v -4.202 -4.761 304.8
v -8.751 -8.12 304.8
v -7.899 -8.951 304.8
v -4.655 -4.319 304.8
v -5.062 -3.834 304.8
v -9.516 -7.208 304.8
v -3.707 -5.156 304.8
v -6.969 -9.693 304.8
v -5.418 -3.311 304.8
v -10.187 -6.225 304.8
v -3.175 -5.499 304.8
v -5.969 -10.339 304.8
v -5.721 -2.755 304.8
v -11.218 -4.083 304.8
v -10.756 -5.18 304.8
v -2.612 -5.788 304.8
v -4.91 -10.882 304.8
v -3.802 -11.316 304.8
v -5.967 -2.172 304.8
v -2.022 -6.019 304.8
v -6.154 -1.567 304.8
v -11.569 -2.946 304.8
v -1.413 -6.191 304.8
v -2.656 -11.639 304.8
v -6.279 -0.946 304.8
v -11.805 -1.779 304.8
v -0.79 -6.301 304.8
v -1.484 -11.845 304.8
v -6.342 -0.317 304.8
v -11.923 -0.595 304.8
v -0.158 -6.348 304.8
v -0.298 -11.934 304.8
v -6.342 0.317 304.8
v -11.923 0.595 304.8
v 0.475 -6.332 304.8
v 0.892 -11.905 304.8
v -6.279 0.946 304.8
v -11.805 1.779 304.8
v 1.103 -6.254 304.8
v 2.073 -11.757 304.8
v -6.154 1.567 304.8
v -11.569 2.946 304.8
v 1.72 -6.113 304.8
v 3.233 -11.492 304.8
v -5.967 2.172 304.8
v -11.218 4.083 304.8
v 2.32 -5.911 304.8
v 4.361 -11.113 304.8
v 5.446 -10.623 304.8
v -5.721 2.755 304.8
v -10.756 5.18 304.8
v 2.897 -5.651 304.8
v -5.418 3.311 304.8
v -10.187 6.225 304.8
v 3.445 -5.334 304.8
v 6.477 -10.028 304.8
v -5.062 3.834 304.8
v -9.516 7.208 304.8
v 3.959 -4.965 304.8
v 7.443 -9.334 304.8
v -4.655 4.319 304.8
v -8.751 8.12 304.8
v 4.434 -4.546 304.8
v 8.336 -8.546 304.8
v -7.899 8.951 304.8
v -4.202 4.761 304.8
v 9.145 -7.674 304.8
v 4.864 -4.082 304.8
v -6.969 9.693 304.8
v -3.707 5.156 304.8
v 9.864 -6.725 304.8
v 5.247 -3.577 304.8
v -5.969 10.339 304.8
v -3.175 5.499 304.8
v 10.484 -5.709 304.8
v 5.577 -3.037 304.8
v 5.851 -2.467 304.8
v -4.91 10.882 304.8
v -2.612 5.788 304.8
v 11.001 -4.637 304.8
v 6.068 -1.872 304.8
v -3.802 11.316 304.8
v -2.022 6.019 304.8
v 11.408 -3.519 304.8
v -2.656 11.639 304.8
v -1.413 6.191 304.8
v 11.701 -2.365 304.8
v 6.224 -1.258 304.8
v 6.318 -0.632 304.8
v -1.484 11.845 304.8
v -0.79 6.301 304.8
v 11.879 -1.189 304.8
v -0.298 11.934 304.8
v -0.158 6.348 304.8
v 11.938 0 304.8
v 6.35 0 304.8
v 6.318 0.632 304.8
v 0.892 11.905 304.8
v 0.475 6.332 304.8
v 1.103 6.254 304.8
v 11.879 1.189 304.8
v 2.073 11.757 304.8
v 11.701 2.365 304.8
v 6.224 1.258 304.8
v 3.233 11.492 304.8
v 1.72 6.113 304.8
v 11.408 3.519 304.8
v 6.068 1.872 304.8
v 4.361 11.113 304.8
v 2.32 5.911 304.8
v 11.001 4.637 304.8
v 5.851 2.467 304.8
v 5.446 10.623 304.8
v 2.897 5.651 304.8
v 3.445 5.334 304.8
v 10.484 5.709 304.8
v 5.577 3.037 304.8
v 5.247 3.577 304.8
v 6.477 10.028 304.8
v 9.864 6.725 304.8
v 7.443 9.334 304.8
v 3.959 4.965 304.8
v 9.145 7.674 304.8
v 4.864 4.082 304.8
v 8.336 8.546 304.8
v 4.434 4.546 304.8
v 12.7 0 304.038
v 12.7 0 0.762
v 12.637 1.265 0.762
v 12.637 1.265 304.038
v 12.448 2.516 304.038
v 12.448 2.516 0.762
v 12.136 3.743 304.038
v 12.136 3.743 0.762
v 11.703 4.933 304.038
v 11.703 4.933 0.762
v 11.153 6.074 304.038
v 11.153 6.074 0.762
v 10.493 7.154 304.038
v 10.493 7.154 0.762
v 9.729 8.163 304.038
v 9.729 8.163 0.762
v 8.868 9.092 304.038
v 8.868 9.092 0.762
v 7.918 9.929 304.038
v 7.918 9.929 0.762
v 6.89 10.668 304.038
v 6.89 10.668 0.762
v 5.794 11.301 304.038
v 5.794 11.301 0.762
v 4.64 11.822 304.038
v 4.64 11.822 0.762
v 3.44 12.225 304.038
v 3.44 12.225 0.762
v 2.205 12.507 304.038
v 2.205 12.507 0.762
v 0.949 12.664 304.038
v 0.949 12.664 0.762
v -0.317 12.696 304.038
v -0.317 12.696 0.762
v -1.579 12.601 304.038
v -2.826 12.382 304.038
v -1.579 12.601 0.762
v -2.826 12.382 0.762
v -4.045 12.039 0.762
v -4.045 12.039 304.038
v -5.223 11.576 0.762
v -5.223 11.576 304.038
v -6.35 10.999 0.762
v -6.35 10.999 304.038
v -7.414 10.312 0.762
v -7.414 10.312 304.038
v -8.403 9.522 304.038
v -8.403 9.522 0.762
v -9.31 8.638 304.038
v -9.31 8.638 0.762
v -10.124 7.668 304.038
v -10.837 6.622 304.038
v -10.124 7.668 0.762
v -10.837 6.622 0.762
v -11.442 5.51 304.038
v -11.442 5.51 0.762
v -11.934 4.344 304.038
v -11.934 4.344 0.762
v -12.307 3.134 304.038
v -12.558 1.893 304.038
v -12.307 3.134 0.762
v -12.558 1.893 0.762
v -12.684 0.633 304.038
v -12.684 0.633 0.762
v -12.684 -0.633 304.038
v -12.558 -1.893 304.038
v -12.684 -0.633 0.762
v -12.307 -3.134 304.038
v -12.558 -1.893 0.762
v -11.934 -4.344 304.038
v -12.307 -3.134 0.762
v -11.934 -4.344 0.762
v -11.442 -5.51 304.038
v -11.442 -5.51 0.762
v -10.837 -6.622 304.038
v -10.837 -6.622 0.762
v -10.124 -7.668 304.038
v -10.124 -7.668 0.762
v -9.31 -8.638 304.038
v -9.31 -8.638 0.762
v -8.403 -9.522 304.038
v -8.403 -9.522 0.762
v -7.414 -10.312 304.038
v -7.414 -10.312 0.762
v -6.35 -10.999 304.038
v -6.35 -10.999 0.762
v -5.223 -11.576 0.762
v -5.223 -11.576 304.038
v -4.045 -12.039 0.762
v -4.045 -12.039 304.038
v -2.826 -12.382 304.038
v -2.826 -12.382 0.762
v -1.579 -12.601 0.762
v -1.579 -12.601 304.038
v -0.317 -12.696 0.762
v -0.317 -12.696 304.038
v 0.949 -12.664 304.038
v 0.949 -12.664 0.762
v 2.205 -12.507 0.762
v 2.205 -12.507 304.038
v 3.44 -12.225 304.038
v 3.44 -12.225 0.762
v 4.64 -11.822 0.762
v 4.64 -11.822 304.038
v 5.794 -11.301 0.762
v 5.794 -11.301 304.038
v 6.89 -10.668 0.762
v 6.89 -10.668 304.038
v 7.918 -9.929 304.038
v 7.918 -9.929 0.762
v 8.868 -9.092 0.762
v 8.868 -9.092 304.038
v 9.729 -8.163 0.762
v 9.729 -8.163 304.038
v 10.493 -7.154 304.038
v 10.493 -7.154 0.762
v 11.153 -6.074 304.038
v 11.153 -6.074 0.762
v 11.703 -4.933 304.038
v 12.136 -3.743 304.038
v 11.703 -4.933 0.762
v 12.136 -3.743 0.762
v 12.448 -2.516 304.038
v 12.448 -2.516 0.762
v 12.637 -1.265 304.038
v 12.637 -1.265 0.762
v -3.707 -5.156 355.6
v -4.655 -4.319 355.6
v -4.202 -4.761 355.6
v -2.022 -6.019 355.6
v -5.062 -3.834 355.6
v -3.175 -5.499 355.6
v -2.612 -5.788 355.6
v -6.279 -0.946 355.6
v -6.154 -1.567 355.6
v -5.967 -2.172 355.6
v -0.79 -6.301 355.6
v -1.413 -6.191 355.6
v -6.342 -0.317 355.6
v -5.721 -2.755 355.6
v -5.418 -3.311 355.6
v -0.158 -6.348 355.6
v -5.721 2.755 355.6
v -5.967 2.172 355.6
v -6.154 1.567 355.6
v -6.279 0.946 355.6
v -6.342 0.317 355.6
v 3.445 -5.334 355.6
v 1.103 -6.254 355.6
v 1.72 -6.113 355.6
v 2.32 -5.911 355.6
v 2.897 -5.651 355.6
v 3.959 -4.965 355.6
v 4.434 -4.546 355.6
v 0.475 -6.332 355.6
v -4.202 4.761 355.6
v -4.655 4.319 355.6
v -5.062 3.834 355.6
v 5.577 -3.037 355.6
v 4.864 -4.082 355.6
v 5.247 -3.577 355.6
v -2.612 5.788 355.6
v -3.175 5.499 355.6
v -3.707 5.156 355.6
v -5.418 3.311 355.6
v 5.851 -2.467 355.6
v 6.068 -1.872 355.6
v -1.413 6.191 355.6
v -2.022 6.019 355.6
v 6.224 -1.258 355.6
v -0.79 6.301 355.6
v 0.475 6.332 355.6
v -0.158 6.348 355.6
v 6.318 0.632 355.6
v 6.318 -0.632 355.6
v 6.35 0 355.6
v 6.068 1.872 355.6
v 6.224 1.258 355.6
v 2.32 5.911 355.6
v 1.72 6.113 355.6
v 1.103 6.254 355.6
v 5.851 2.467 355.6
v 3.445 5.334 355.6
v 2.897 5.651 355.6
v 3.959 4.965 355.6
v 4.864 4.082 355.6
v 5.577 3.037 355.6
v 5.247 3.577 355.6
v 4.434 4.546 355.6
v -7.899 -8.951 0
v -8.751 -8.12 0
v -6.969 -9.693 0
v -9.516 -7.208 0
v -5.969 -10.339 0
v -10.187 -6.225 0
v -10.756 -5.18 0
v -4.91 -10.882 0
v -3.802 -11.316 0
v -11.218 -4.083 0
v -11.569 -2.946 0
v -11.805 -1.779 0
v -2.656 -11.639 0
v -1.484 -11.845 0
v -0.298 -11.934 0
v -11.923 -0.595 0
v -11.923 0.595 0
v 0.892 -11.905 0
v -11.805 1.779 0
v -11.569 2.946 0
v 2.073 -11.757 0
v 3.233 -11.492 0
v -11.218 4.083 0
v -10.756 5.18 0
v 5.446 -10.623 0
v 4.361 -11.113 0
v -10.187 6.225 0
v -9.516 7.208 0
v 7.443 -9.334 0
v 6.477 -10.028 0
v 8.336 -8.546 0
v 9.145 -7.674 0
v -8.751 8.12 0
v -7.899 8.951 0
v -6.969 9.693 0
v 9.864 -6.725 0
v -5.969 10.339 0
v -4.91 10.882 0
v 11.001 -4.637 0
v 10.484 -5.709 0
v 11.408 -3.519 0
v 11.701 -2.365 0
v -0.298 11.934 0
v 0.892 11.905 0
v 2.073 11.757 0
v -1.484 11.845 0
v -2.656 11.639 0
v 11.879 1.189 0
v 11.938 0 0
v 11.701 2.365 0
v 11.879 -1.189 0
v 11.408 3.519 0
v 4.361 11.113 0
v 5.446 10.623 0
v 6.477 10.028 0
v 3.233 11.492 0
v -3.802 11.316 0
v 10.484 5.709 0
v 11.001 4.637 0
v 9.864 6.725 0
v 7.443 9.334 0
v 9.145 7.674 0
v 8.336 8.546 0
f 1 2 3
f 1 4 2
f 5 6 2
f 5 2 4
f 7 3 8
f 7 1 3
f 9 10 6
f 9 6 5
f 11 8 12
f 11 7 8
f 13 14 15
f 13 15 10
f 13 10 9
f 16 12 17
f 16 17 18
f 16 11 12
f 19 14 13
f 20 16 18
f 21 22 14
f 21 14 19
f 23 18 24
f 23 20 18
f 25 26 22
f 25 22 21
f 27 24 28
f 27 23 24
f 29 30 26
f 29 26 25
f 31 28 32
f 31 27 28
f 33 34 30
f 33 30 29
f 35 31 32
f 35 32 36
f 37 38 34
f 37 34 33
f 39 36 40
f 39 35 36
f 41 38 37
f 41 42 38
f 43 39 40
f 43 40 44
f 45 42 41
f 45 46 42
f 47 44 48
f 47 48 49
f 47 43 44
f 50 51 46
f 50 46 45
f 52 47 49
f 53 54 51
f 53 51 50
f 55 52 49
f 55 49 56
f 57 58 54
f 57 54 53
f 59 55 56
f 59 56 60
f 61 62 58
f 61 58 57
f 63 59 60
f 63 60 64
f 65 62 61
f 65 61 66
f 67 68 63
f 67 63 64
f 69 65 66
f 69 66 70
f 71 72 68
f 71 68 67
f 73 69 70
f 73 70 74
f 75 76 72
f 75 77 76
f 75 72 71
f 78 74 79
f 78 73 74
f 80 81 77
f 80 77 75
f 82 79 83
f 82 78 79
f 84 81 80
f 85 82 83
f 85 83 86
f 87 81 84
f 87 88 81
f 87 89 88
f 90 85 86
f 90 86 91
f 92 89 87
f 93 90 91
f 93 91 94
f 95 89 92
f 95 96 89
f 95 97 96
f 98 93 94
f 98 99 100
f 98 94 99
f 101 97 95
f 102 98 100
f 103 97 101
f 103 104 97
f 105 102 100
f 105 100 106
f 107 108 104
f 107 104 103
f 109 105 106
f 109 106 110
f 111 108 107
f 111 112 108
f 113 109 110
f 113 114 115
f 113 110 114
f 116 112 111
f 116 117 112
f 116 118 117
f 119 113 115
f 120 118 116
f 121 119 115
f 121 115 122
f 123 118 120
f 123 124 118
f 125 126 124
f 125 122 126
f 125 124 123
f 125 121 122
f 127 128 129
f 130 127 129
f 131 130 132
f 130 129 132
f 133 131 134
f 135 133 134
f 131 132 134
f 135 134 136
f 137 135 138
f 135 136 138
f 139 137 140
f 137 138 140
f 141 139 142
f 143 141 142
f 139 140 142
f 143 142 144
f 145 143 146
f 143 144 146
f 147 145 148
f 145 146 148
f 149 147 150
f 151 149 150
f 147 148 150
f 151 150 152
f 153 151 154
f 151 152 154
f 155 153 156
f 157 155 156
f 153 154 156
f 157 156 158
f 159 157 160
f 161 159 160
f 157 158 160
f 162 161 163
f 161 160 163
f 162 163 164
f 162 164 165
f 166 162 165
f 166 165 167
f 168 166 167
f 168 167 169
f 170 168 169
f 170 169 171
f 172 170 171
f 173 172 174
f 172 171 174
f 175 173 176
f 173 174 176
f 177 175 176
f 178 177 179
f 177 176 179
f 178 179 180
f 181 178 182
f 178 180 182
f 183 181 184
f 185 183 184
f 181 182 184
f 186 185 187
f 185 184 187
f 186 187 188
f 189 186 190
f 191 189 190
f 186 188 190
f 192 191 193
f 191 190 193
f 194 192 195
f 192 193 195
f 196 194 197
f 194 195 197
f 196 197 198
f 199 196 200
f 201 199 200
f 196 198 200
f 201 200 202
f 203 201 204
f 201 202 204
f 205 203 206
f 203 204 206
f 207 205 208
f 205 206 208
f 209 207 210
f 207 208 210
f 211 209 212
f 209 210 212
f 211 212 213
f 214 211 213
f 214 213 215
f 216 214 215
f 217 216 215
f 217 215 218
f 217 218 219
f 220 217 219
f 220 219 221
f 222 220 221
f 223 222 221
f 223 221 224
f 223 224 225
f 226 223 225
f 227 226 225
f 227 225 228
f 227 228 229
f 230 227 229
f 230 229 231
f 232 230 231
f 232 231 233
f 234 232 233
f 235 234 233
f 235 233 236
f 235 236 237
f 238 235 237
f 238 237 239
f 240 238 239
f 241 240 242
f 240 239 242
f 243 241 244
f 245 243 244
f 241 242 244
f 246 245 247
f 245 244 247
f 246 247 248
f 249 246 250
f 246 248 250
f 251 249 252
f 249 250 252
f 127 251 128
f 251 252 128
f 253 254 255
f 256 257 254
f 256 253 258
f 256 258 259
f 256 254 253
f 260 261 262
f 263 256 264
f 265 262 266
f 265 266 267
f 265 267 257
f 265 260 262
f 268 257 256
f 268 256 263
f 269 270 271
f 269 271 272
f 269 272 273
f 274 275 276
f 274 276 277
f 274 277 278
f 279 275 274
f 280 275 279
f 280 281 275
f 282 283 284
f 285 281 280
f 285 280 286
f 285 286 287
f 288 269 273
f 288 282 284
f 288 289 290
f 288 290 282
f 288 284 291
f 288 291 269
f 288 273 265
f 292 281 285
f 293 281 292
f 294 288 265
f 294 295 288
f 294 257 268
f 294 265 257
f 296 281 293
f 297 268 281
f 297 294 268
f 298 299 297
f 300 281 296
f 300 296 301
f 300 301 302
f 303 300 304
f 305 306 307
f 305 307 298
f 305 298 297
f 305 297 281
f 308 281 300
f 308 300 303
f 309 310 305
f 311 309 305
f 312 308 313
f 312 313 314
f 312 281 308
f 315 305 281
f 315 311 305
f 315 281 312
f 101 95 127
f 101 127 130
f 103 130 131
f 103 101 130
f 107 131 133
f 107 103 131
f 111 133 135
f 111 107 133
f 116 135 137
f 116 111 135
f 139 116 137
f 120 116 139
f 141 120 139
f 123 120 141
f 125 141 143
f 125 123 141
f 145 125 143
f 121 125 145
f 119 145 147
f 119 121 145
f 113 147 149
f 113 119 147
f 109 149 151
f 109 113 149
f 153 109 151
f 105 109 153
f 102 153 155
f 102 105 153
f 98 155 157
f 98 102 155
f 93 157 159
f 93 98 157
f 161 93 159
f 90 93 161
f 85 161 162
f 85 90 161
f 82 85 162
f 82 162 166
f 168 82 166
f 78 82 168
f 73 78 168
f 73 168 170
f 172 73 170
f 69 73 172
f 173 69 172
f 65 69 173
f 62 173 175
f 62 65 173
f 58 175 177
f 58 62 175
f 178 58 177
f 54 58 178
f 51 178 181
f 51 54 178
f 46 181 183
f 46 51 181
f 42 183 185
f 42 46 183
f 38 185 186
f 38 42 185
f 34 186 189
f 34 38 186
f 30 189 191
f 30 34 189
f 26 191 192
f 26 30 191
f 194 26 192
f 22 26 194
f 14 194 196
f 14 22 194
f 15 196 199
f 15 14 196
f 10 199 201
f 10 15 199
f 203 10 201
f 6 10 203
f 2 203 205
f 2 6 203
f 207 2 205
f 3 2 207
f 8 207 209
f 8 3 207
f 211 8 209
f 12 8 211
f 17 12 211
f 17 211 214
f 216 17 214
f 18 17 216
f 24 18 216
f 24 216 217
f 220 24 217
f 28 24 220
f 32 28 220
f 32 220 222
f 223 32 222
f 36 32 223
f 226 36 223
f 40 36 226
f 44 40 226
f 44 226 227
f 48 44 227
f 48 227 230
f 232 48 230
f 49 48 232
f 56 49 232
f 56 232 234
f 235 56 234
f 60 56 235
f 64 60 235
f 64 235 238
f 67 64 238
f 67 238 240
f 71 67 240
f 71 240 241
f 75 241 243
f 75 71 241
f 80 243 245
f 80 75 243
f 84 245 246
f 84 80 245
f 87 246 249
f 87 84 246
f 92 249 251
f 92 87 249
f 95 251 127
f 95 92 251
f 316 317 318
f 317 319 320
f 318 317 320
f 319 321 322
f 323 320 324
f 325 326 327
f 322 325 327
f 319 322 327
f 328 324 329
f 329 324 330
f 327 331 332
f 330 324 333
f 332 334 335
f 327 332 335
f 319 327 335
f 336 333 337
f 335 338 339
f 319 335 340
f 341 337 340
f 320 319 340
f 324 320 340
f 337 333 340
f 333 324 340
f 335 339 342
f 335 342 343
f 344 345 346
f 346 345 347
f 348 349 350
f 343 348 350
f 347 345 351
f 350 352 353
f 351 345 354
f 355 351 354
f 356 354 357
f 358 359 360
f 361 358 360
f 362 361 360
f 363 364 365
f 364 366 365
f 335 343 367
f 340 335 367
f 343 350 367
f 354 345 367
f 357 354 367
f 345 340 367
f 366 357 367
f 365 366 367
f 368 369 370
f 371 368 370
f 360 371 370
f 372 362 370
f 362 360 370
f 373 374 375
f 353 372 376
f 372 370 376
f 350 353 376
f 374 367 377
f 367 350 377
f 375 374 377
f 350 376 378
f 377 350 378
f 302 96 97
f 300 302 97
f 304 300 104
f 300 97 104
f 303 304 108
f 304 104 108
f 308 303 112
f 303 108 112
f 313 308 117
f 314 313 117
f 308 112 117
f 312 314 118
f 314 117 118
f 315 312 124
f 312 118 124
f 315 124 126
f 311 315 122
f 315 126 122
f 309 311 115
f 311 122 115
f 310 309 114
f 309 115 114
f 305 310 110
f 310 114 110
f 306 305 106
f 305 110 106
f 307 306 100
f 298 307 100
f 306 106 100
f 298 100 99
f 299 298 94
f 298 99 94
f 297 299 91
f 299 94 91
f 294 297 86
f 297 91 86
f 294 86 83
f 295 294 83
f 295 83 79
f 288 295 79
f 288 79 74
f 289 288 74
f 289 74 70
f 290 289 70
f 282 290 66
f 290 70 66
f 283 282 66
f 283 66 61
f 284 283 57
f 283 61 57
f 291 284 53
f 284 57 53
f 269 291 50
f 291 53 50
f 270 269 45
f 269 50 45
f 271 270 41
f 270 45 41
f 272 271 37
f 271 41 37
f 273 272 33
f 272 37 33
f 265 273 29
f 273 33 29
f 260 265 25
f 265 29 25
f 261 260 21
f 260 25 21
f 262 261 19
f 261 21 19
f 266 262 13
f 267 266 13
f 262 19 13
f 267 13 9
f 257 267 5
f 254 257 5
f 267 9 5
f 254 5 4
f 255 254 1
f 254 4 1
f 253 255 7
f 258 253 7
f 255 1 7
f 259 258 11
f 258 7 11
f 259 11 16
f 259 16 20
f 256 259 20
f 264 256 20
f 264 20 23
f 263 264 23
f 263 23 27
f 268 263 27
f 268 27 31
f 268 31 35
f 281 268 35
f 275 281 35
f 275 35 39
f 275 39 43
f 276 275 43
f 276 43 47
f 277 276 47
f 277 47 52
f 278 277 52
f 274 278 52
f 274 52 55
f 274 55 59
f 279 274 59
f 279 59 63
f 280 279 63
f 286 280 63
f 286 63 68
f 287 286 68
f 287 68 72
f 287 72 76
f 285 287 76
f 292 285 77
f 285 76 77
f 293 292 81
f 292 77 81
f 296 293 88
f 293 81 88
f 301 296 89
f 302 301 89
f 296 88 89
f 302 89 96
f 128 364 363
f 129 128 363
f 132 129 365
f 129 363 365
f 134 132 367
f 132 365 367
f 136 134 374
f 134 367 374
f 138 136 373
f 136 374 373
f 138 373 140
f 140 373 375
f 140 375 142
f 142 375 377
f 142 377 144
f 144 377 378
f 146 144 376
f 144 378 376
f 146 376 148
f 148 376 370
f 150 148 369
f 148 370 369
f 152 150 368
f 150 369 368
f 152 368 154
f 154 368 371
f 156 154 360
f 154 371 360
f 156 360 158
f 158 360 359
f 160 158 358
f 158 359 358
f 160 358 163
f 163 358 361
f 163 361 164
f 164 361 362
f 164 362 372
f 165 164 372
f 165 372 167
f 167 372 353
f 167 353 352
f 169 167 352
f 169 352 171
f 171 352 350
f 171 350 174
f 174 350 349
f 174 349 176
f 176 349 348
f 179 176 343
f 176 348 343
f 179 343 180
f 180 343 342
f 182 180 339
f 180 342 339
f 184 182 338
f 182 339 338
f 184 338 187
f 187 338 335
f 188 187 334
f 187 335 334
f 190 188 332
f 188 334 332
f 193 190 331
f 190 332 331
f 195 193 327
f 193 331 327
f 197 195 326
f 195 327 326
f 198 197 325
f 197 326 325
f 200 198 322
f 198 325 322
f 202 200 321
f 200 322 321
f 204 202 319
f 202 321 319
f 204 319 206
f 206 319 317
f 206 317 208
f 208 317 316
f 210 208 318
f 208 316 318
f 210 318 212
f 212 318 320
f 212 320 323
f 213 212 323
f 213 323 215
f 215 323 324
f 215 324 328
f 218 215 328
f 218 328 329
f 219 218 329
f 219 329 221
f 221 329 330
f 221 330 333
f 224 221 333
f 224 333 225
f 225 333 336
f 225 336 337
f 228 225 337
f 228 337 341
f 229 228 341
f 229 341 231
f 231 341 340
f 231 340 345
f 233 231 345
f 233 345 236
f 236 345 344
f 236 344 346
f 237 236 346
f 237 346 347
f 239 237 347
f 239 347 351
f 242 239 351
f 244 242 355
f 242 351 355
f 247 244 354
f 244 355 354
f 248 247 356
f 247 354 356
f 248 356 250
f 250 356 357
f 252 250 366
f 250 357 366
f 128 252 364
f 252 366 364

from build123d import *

# Parameters (mm, degrees)
F0_R     = 12.7
F1_DEPTH = 304.8
F2_SIZE  = 0.762
F3_R     = 6.35
F4_DEPTH = 50.8


with BuildPart() as f1:
    # F0 (on Top) → F1 (new body)
    with BuildSketch(Plane.XY):
        Circle(F0_R)
    extrude(amount=F1_DEPTH)

    # F2
    f2_edges = [f1.edges().sort_by_distance(p)[0] for p in [
        (-12.7, 0, 0),
        (-12.7, 0, 304.8),
    ]]
    chamfer(f2_edges, length=F2_SIZE)

    # F3 (on face) → F4 (join)
    with BuildSketch(Plane.XY.offset(304.8)):
        Circle(F3_R)
    extrude(amount=F4_DEPTH)


solid = f1.part
